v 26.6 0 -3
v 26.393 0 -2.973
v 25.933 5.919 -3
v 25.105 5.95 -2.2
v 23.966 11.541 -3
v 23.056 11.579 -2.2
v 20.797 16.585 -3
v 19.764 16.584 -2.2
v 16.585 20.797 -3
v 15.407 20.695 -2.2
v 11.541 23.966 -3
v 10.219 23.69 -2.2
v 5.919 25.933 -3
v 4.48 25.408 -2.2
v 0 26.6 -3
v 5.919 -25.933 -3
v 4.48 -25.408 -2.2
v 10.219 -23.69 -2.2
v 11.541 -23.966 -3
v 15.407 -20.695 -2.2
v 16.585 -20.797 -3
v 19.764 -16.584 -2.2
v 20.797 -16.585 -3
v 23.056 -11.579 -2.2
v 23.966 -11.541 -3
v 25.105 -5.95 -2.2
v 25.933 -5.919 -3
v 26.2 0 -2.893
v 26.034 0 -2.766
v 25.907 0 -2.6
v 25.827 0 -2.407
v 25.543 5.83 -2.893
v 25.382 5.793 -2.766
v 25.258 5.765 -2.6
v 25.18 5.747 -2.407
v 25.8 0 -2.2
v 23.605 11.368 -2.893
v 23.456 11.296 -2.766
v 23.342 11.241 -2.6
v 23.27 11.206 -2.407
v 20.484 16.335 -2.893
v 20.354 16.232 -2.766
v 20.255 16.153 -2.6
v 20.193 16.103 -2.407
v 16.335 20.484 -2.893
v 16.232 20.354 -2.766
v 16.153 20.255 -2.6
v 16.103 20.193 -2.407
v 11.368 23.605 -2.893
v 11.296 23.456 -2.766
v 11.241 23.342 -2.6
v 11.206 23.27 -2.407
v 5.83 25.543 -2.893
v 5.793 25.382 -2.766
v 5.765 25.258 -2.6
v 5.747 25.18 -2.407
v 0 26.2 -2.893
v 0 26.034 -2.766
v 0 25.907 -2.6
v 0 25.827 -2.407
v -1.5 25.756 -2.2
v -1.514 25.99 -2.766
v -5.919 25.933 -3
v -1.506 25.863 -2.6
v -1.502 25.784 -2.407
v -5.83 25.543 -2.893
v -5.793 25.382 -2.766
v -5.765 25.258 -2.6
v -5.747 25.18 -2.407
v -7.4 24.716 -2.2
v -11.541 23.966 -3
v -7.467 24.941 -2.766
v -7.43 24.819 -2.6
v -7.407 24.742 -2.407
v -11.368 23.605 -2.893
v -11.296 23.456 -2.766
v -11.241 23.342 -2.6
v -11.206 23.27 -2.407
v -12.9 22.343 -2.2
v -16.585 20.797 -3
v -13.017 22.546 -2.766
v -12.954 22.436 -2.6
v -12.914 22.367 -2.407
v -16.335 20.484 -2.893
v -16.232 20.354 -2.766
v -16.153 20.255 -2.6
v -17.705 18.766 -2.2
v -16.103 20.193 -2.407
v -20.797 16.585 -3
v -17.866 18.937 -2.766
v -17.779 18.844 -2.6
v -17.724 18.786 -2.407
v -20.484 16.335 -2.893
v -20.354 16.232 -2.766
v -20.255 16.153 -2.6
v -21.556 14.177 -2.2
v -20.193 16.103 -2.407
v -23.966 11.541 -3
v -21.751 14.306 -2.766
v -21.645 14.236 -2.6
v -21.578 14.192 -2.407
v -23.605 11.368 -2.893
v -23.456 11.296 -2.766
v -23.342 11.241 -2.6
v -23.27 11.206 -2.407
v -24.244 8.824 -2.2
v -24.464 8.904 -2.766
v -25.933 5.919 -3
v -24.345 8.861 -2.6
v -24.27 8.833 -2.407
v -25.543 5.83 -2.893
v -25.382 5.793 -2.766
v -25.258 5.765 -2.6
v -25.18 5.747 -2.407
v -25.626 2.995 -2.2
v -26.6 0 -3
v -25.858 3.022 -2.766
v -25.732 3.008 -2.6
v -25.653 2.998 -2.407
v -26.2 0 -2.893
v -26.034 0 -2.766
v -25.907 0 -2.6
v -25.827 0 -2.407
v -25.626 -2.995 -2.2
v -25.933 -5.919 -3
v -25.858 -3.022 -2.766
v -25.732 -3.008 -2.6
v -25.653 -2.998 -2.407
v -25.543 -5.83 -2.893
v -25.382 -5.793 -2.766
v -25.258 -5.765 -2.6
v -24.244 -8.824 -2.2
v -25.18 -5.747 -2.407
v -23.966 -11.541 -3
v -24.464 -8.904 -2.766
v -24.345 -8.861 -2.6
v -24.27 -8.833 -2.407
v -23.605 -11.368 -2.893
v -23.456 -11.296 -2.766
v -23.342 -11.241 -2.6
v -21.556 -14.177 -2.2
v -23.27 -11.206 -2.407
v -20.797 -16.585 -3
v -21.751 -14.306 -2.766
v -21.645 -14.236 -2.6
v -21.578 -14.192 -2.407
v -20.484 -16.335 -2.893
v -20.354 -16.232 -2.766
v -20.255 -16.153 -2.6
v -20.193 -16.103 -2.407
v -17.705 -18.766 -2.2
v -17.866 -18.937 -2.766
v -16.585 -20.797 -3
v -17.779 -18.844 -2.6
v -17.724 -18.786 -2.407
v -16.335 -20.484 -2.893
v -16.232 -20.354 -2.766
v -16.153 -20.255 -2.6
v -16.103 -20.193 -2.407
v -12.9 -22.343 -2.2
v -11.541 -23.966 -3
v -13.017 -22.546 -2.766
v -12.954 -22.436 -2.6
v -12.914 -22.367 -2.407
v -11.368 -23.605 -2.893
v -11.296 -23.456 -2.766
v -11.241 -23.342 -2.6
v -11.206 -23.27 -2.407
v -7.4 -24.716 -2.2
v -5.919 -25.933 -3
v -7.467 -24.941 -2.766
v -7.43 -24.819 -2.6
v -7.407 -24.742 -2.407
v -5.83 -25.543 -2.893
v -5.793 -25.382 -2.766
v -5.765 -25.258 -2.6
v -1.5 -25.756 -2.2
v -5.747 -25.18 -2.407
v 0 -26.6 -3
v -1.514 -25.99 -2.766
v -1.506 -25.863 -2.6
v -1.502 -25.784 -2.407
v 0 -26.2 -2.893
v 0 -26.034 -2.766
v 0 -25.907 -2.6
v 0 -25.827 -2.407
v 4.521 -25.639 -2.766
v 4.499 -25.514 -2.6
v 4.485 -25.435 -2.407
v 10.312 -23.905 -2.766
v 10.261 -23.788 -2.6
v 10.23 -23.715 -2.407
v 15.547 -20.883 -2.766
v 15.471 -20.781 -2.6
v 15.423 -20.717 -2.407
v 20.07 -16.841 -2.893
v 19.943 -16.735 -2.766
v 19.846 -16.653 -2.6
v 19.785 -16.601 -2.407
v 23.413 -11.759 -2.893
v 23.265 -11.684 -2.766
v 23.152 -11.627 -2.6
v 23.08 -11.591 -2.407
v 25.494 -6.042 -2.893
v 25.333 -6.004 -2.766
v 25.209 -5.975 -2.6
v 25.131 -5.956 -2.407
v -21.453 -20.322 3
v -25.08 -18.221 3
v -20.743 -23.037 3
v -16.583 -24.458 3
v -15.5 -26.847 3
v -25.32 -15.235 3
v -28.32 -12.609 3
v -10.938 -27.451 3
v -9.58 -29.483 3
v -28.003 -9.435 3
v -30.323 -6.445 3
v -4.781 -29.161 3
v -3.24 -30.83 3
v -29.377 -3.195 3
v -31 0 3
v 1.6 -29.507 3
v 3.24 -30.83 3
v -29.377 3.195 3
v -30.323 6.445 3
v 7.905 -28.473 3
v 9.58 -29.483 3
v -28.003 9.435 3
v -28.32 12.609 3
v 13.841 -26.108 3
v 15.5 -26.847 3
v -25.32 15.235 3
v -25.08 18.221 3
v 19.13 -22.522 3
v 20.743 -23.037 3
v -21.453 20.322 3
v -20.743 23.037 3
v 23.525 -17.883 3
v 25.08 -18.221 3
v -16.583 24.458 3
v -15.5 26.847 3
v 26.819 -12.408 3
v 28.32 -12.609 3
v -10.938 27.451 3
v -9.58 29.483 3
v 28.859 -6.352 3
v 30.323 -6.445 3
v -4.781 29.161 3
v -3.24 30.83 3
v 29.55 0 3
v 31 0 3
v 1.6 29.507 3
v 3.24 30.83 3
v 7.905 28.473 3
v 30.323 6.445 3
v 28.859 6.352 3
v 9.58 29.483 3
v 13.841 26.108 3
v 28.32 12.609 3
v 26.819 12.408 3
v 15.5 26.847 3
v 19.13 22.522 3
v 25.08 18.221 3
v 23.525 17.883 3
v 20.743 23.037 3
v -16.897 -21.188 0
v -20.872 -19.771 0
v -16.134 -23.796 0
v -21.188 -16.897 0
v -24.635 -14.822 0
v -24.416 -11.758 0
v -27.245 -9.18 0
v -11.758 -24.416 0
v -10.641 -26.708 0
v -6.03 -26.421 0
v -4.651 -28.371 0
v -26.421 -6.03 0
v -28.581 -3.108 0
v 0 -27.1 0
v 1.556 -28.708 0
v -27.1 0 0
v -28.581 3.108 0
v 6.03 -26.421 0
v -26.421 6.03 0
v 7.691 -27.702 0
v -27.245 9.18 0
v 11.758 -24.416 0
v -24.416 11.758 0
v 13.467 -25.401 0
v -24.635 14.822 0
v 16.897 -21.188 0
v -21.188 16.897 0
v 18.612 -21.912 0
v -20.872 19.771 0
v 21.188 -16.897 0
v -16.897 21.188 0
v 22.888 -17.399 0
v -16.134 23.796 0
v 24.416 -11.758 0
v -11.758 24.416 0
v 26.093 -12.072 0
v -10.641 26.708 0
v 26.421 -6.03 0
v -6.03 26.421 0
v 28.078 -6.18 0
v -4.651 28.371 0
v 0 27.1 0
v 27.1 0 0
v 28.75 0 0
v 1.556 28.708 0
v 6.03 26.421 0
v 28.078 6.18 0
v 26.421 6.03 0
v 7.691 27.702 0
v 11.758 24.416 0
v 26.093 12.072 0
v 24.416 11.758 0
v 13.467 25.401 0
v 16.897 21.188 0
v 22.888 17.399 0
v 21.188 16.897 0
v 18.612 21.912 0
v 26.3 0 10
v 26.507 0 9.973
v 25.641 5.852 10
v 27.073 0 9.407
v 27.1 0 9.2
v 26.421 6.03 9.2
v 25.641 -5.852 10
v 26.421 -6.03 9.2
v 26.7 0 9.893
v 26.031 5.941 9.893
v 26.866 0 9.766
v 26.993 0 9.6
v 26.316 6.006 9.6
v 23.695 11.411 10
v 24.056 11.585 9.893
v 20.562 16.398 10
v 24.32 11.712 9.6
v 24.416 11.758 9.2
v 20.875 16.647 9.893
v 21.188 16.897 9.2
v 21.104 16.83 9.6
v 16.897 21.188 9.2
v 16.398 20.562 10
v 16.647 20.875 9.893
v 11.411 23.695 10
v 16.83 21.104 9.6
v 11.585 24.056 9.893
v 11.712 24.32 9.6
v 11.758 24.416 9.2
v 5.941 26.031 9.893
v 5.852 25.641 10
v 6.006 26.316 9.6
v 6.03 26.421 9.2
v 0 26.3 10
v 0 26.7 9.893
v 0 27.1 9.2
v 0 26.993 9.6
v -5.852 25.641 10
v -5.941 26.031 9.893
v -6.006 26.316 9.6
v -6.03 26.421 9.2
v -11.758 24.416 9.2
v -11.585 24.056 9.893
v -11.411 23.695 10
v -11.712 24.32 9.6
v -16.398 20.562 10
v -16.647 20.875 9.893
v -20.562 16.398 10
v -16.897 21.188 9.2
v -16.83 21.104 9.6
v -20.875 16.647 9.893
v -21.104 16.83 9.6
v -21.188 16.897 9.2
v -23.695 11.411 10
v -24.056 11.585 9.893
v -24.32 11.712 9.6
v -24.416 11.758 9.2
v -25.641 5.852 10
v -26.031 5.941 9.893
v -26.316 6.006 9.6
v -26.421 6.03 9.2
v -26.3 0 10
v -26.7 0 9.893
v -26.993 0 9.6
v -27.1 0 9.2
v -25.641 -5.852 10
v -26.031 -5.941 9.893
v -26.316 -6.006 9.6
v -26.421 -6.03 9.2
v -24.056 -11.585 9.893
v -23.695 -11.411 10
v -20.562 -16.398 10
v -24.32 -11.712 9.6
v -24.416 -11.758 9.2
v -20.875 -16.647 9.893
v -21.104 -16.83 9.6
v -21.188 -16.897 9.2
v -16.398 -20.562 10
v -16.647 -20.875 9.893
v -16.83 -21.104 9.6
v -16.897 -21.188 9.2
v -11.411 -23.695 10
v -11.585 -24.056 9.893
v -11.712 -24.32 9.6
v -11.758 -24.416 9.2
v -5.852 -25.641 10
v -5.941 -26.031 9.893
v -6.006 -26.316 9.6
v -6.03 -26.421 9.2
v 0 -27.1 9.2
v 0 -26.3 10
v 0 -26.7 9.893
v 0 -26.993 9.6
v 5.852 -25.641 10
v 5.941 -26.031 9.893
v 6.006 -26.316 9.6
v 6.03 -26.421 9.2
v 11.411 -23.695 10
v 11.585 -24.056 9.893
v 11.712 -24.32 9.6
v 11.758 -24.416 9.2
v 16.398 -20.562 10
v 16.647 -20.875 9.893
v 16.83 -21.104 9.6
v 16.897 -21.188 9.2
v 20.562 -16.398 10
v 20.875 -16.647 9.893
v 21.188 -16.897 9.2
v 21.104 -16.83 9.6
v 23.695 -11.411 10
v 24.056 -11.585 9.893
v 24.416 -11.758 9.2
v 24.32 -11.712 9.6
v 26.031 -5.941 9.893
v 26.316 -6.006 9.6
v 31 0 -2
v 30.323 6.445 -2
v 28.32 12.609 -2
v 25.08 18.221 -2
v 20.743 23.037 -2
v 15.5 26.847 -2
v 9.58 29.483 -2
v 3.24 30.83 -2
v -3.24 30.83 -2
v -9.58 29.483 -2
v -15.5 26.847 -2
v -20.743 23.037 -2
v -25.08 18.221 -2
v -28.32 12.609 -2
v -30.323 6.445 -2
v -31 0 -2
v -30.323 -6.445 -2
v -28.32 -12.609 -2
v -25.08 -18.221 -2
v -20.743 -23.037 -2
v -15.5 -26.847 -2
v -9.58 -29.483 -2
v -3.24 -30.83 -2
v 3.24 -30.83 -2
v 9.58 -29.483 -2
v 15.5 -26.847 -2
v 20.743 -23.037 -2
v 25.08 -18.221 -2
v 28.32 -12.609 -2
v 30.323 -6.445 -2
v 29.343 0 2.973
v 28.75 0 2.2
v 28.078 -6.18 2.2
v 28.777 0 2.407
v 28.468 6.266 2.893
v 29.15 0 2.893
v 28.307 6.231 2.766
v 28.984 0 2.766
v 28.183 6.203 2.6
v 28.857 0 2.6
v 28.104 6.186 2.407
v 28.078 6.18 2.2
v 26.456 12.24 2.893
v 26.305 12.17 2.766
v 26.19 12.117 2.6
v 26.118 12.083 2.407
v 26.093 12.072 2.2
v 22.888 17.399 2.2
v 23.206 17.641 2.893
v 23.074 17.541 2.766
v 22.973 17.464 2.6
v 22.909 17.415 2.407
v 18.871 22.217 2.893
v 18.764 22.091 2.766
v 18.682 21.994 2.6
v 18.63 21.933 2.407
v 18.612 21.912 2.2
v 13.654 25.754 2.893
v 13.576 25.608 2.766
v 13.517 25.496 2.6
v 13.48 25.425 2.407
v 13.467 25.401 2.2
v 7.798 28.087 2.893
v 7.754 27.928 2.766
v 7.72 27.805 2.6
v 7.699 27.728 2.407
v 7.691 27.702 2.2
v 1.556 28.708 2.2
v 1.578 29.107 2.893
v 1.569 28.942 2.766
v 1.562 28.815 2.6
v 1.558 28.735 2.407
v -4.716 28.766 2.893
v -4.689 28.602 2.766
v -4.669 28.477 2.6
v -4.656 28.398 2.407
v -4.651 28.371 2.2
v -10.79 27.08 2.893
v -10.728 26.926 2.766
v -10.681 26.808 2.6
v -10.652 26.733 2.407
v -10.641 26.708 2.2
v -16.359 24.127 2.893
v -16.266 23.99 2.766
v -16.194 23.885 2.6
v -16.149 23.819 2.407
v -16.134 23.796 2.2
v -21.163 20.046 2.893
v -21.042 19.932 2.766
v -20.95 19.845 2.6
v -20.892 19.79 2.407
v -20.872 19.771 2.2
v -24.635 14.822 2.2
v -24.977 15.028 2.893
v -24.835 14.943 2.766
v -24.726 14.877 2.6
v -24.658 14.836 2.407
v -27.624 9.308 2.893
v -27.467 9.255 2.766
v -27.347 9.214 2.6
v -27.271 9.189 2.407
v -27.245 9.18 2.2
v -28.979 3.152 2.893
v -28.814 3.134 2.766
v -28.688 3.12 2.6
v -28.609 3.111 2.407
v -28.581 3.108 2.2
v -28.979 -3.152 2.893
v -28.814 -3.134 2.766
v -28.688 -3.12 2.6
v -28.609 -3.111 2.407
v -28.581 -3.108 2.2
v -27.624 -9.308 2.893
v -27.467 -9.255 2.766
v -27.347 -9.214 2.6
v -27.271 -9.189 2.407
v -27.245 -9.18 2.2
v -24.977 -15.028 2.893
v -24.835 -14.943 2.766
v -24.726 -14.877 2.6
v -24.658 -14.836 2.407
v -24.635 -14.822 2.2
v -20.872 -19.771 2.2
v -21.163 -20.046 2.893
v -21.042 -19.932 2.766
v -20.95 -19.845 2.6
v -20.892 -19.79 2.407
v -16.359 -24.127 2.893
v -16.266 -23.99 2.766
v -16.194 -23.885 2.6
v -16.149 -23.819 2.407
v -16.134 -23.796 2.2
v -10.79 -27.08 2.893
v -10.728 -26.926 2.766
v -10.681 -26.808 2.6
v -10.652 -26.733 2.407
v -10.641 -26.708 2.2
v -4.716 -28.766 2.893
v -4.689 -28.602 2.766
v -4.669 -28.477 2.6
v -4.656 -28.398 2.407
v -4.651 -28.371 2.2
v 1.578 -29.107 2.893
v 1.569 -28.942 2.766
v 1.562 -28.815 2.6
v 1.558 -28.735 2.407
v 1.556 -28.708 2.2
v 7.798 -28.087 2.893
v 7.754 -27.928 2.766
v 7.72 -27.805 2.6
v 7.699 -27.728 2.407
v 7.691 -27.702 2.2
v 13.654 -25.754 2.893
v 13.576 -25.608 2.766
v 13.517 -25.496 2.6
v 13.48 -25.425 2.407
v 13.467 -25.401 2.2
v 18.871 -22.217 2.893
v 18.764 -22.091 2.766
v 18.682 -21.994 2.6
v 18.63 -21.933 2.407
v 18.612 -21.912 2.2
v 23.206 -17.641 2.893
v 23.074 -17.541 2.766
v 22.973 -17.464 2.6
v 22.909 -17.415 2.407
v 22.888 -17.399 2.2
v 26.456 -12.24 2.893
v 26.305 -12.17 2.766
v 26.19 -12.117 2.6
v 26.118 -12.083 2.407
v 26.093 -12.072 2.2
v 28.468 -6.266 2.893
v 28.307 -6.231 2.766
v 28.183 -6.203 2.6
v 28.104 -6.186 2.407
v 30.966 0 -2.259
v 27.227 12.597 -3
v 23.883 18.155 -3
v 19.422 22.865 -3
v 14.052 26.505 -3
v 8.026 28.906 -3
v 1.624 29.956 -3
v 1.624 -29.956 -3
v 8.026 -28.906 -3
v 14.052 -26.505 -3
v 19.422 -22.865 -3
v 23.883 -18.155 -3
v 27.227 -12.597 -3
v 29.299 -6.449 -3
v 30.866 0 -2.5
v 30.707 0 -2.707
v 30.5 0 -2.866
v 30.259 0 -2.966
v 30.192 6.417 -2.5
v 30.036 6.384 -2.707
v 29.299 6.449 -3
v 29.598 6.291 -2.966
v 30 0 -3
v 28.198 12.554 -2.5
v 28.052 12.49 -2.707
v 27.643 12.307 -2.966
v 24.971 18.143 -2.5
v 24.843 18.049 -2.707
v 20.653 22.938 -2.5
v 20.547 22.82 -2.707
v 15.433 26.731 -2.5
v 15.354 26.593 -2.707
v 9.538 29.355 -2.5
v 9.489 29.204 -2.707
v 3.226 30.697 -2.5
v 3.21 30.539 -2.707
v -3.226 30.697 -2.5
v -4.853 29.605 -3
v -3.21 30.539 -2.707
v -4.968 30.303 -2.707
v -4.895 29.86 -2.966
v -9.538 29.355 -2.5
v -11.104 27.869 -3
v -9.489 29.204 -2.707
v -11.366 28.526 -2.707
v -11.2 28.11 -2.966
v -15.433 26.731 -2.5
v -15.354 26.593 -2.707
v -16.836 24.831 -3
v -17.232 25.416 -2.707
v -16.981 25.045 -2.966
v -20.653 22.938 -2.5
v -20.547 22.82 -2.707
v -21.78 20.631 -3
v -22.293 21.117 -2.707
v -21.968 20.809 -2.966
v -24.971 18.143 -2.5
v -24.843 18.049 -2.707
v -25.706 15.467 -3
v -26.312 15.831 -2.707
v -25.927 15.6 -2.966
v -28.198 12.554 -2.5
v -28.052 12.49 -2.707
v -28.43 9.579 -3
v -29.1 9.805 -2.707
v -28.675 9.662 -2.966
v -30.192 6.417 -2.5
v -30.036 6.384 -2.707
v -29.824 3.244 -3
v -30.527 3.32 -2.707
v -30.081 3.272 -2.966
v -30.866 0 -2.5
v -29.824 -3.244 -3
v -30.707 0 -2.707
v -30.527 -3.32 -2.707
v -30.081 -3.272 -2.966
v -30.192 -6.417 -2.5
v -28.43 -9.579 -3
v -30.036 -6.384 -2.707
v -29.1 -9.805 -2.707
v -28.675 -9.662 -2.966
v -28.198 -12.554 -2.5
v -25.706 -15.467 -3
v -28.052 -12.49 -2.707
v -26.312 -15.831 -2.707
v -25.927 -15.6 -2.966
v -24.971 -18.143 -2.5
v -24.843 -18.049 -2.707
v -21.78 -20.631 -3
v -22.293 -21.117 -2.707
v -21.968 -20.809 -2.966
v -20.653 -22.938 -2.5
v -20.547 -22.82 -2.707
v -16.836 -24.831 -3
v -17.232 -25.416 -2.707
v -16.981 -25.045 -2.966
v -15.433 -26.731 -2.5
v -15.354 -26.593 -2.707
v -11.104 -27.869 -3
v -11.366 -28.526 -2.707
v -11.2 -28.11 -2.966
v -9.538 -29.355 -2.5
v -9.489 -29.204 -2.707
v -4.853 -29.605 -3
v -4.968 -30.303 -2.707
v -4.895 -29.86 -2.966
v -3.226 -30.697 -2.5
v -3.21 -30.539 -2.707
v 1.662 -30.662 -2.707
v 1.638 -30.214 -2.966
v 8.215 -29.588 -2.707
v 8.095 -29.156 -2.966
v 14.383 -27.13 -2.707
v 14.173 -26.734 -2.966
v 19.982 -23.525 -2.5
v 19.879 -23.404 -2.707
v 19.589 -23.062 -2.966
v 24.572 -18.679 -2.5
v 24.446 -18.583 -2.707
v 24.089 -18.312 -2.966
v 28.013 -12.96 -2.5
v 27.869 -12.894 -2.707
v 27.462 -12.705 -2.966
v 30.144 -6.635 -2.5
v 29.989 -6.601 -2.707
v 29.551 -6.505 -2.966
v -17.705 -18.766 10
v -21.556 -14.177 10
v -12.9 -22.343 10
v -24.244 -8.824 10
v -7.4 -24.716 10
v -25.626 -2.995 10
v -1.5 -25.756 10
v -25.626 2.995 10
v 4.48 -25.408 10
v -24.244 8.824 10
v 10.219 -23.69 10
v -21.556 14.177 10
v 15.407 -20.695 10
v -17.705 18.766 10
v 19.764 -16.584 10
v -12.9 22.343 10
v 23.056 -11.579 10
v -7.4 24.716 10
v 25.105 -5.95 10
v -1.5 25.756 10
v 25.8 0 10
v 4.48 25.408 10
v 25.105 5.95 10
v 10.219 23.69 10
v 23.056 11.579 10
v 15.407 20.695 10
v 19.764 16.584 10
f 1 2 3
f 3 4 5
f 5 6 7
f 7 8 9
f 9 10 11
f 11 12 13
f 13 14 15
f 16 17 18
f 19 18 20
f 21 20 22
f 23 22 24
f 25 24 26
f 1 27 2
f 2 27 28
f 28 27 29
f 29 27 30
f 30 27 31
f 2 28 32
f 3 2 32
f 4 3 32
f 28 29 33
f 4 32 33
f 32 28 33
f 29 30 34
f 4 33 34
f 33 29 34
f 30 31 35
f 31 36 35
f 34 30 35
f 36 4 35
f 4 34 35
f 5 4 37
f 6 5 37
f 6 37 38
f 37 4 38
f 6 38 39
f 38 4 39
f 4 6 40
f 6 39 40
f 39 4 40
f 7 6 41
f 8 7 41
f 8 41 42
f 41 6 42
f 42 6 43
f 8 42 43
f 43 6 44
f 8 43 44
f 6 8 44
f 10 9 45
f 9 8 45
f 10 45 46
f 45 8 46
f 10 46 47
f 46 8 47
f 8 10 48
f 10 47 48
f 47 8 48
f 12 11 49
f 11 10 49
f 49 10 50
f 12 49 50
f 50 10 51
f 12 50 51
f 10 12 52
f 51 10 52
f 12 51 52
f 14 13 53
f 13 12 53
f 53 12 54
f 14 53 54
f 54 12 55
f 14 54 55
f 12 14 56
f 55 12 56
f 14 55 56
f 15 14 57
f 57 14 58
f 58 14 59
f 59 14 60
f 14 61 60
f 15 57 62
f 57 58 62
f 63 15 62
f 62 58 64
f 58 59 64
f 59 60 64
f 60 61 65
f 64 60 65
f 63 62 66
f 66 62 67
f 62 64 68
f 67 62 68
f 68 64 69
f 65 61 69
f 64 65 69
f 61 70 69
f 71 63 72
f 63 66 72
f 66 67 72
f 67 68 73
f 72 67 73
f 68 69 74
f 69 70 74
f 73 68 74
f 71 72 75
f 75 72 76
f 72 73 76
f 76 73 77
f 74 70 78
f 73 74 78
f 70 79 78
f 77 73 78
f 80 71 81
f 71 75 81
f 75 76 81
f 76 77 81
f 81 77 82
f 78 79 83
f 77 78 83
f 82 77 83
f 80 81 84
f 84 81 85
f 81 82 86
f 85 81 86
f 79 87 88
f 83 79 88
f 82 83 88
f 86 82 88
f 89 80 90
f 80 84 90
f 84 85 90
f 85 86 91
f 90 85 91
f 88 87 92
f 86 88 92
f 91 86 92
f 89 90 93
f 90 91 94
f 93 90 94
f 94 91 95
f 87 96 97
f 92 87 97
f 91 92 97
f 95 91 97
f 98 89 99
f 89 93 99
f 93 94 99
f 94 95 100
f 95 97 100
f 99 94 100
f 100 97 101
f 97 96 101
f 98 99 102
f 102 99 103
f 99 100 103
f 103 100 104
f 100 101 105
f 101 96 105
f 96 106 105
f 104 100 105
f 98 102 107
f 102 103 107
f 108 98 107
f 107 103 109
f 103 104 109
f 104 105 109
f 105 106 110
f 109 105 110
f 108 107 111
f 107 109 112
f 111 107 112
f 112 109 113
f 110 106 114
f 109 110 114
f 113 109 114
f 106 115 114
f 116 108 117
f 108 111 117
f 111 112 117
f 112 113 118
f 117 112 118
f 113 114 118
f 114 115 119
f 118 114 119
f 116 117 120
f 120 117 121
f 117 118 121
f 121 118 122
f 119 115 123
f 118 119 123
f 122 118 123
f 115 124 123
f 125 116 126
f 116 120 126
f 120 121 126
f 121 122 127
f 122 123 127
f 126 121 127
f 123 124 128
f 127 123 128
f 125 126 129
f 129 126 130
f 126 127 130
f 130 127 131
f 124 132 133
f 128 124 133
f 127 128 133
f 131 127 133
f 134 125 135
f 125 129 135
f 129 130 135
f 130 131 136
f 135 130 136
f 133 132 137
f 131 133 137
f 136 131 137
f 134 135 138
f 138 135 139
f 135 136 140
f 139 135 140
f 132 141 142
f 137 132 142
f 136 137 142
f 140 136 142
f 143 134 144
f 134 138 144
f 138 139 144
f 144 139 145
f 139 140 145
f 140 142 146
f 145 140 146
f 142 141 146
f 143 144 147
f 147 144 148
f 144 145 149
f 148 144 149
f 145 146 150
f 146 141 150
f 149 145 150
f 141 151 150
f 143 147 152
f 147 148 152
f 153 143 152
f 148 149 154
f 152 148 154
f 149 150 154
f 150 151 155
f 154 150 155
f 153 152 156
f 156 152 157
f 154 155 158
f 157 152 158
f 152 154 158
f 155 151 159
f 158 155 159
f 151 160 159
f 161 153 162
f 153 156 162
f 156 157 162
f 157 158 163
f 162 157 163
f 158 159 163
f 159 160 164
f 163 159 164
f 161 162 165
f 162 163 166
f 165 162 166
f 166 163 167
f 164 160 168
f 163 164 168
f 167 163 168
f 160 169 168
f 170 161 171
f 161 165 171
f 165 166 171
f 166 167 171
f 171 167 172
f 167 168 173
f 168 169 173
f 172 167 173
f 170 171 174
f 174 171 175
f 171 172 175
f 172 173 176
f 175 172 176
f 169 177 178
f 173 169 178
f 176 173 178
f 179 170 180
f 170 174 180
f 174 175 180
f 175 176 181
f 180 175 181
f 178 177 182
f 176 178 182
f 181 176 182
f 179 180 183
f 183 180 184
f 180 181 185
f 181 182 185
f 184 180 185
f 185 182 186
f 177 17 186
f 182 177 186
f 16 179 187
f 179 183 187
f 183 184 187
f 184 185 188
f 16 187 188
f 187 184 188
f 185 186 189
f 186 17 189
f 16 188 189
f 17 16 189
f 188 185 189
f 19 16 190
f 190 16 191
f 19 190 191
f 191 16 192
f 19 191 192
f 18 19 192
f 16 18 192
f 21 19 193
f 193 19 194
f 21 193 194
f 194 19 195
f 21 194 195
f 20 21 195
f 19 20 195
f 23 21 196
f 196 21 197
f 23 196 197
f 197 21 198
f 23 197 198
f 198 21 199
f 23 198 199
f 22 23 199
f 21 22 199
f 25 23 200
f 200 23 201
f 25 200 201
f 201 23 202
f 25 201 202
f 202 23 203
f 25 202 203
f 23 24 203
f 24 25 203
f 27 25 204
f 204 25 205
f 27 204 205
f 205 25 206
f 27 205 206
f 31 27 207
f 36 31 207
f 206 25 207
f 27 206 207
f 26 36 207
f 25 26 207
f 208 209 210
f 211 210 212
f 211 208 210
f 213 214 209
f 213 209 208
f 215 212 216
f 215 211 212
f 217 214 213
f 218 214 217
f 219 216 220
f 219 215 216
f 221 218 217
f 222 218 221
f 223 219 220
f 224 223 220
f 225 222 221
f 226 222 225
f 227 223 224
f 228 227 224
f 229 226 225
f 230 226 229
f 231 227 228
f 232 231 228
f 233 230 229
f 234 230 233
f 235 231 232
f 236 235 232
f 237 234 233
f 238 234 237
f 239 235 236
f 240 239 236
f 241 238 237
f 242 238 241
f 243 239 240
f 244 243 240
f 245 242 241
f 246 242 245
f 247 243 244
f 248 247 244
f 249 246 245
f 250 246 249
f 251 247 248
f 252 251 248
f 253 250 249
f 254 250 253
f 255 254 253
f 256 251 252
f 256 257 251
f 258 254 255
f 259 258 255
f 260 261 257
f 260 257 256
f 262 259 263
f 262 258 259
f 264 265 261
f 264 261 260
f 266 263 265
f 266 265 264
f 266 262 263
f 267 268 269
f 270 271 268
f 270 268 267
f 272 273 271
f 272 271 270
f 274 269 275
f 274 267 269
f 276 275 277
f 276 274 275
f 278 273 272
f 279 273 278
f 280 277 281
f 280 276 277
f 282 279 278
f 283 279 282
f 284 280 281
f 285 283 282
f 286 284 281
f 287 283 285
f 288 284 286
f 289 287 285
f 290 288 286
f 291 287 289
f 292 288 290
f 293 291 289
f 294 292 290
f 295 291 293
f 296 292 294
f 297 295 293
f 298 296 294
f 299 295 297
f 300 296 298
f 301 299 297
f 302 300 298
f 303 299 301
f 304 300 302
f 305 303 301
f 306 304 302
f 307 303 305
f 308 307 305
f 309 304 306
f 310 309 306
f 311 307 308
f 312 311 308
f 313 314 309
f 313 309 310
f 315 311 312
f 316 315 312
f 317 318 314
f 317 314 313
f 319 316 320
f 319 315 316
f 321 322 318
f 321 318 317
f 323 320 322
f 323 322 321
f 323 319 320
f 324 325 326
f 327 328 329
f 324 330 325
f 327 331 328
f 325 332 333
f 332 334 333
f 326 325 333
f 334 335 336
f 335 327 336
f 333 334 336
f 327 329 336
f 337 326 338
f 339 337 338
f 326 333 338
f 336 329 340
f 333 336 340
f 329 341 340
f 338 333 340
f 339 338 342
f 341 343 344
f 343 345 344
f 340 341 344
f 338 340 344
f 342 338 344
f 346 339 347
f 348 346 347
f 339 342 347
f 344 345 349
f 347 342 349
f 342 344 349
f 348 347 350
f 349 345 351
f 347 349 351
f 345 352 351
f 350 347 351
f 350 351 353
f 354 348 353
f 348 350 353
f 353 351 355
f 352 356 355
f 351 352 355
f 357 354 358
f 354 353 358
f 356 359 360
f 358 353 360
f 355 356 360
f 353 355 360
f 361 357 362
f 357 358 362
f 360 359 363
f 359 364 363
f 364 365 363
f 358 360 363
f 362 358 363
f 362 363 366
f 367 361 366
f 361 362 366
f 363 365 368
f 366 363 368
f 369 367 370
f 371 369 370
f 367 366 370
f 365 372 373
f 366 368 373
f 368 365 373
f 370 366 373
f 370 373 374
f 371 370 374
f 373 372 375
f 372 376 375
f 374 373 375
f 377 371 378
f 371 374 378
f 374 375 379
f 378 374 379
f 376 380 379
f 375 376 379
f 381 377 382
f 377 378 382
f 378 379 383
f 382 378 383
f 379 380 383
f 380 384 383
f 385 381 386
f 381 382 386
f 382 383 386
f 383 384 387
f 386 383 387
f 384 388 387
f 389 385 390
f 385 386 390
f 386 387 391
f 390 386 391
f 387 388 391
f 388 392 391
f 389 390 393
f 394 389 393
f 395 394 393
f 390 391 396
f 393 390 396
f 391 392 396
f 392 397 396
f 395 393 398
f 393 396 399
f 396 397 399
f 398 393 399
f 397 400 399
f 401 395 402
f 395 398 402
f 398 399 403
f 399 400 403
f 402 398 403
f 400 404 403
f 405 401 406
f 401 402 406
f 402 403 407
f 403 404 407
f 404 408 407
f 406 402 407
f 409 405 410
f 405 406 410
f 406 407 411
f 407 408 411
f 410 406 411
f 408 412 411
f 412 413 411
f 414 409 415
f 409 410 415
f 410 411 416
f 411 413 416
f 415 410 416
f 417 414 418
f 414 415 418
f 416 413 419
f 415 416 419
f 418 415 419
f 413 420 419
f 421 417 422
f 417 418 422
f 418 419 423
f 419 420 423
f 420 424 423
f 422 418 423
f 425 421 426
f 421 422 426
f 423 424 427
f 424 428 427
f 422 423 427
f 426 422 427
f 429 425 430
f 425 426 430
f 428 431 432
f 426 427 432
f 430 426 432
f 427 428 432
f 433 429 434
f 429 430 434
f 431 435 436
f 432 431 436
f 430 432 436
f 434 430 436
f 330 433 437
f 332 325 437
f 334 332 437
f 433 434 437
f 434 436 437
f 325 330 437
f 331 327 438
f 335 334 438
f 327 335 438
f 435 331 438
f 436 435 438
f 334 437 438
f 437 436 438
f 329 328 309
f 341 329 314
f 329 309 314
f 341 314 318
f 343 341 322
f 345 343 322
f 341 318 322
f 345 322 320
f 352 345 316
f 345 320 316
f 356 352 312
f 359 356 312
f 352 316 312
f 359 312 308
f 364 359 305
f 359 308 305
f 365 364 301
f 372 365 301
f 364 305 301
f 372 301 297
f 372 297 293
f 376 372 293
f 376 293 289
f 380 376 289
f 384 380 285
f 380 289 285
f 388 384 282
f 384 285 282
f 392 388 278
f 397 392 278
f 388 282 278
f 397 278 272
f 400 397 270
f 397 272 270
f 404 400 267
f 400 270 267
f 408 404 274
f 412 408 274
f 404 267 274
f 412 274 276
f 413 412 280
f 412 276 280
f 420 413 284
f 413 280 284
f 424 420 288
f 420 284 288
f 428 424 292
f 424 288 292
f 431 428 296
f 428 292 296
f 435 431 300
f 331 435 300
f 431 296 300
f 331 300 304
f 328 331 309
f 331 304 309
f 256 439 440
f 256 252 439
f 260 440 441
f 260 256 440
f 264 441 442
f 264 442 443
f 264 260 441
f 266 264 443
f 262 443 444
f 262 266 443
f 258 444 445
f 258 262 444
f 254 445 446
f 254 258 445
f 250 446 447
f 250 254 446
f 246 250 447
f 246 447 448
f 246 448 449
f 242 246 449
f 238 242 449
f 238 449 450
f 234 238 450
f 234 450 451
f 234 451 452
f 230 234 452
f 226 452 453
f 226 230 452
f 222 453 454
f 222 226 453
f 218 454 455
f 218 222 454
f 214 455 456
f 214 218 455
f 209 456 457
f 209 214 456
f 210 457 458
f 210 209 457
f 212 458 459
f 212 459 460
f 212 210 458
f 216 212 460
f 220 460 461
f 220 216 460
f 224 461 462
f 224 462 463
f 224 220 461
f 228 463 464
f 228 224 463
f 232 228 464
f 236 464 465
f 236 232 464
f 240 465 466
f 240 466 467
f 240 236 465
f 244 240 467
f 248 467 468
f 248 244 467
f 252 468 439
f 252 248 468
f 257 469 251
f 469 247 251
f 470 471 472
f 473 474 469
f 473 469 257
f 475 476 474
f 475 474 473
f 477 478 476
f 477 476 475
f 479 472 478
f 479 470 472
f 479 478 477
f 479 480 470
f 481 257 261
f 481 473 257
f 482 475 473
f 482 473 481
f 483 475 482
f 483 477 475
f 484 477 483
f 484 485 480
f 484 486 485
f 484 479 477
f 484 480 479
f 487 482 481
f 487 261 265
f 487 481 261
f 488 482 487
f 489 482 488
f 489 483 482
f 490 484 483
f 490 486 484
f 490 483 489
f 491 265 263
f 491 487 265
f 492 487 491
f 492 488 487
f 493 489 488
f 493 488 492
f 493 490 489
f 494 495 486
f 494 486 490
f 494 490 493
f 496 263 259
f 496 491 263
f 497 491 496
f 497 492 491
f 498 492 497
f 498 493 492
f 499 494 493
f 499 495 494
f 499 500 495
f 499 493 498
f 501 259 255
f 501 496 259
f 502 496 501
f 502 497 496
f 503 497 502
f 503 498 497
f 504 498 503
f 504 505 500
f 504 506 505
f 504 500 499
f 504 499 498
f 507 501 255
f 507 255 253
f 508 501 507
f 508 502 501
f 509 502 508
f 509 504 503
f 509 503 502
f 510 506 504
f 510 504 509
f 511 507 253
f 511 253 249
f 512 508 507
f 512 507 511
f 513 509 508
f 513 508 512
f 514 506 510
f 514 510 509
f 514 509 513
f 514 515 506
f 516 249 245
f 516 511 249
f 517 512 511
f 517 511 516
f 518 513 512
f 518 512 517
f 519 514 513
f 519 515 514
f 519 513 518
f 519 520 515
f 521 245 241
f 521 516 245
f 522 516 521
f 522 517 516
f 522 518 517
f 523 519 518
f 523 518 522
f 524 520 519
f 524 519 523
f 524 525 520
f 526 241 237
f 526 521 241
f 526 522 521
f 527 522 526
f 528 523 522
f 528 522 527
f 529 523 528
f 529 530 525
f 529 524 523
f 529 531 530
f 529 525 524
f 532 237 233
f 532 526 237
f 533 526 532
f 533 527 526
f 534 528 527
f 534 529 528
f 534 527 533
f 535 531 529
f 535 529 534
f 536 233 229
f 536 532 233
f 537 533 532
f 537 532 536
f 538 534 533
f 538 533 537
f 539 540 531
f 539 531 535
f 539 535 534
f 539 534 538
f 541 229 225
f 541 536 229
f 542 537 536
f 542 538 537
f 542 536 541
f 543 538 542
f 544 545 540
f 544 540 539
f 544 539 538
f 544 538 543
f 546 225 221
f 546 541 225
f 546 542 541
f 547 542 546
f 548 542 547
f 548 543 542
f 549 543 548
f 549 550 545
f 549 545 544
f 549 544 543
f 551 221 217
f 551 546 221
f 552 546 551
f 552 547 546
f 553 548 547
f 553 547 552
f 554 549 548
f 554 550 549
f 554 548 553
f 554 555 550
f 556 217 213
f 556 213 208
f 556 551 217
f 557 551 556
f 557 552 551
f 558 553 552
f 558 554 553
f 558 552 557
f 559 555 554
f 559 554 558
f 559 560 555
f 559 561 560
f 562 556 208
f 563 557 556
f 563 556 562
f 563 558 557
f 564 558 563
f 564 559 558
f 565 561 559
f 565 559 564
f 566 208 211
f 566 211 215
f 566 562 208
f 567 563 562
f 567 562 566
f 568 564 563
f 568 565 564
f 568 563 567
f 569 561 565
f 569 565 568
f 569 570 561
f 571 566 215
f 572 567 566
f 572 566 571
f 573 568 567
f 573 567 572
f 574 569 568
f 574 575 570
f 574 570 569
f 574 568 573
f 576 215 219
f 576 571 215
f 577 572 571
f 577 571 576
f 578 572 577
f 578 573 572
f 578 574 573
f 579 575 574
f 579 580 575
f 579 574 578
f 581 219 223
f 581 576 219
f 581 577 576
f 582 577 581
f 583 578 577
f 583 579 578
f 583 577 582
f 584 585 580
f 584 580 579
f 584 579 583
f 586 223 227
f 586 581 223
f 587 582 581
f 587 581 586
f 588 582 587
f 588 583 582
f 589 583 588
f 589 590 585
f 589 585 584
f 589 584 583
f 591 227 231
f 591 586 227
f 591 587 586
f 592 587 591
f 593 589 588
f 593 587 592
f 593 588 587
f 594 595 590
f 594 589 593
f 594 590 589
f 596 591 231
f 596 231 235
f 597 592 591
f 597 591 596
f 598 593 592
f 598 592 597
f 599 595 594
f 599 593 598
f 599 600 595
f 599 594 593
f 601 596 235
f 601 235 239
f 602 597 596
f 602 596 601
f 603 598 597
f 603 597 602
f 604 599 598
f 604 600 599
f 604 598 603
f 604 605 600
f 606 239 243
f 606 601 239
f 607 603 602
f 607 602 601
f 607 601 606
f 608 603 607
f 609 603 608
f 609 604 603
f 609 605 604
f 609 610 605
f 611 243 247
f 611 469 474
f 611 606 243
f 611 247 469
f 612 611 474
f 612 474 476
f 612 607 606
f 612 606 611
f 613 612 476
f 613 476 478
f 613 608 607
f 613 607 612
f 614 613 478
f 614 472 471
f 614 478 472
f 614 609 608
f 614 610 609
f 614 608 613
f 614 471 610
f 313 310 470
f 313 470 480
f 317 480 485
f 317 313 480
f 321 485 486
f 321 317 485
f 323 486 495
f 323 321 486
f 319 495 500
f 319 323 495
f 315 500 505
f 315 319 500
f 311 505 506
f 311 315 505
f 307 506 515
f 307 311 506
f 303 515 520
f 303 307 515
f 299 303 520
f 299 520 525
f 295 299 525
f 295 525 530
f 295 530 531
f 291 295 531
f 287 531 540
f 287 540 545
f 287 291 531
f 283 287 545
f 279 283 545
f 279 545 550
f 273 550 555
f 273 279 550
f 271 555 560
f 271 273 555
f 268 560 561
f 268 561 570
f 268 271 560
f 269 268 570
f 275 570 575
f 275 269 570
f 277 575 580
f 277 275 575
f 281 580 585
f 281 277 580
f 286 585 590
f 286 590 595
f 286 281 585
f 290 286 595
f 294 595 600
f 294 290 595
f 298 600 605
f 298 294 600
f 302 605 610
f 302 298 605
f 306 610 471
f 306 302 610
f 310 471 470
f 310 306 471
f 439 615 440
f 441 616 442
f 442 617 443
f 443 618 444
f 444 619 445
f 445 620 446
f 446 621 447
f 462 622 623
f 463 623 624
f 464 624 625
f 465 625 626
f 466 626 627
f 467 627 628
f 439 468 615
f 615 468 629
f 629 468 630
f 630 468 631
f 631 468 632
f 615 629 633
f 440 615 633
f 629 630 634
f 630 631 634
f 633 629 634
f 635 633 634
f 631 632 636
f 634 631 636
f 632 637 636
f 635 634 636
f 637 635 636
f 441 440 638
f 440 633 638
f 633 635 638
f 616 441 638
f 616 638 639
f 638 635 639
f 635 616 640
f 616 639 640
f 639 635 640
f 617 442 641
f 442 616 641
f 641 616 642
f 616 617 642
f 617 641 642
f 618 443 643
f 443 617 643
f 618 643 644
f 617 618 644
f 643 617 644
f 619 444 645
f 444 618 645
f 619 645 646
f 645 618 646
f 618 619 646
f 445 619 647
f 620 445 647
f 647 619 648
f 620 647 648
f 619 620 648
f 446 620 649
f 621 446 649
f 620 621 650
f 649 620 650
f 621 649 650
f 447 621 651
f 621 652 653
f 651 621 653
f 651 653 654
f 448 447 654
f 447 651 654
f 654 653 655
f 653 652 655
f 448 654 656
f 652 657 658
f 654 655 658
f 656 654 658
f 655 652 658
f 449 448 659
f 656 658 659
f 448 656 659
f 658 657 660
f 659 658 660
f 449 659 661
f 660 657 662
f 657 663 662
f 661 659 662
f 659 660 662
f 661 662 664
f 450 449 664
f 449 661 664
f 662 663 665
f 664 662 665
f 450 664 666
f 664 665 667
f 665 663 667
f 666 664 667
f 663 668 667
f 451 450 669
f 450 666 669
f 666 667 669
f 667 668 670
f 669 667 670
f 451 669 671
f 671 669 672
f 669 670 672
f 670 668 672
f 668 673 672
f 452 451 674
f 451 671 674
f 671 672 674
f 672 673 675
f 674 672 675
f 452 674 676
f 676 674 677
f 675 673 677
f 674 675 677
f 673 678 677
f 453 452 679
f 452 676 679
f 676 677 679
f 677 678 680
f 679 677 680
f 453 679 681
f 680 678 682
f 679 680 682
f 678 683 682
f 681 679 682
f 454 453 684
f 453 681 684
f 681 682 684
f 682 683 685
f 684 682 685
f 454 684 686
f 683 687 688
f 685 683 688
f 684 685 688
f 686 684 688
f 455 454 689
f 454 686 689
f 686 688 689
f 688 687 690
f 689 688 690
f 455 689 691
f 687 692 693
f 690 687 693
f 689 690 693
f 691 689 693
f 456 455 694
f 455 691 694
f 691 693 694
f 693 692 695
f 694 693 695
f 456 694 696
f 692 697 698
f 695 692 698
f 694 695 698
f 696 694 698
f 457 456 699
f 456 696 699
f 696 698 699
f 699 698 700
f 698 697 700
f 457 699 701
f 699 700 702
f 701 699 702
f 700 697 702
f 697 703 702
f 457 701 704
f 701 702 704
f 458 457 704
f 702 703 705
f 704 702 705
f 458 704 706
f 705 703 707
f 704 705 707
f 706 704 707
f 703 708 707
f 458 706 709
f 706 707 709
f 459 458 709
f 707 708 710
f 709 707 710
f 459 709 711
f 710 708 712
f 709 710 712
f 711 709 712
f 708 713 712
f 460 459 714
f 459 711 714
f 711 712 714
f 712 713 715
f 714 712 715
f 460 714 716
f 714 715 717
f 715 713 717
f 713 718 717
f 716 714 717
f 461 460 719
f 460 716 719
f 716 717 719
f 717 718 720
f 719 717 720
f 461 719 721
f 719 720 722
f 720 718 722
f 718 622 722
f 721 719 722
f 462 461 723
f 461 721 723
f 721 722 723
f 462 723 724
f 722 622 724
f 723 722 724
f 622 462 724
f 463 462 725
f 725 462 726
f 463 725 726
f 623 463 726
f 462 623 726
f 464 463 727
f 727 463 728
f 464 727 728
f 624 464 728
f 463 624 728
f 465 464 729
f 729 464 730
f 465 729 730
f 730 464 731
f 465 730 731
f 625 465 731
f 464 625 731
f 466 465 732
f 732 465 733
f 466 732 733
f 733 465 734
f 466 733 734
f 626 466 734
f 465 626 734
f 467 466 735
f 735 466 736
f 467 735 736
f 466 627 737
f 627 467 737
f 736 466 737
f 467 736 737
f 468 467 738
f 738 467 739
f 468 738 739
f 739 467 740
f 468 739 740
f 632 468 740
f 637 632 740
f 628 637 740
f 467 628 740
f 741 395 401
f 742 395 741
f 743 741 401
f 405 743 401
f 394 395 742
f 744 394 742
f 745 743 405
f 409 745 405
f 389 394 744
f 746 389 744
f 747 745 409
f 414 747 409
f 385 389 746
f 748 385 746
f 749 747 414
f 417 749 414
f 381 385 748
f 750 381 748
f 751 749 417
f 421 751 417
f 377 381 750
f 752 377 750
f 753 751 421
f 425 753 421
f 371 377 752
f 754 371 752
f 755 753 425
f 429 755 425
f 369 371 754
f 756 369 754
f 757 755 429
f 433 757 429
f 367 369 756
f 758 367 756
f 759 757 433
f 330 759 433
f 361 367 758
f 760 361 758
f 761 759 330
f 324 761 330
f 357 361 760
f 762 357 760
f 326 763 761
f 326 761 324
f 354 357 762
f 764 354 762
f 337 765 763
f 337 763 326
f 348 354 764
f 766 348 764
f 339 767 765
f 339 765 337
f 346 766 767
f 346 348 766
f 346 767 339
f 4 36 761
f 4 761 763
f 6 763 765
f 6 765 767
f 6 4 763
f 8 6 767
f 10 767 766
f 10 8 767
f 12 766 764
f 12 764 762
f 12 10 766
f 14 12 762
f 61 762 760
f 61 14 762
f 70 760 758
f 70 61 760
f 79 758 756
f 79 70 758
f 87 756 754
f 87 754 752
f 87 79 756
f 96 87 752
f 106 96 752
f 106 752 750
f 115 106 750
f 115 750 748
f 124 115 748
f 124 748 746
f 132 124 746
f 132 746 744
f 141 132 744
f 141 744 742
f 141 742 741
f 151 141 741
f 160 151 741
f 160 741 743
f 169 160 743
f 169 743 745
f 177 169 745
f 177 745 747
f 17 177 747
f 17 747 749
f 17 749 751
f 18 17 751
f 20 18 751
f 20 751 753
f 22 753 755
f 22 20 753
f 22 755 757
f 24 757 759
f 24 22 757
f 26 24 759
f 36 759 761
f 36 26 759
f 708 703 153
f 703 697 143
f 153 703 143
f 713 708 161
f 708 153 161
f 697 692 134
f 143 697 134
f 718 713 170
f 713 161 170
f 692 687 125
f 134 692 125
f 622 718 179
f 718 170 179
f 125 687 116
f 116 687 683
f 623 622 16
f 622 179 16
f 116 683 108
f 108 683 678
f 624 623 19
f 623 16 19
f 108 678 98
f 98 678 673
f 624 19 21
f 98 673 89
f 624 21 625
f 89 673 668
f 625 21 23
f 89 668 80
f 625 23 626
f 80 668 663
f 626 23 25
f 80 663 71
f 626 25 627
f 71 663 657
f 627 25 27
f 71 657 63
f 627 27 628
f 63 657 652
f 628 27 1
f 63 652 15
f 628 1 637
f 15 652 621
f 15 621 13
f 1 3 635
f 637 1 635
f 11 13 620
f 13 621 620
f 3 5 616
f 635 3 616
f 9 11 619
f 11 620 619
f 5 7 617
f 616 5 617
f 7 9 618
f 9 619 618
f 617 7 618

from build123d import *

# Parameters (mm, degrees)
F0_R     = 31
F0_R_2   = 28.75
F0_R_3   = 27.1
F0_R_4   = 25.8
F1_DEPTH = 3
F2_DEPTH = 10
F3_DEPTH = 3
F4_DEPTH = 25
F5_R     = 0.8
F6_R     = 1


with BuildPart() as f1:
    # F0 (on Top) → F1 (new body)
    with BuildSketch(Plane.XY):
        Circle(F0_R)
        Circle(F0_R_2, mode=Mode.SUBTRACT)
        Circle(F0_R_2)
        Circle(F0_R_3, mode=Mode.SUBTRACT)
        Circle(F0_R_3)
        Circle(F0_R_4, mode=Mode.SUBTRACT)
    extrude(amount=-F1_DEPTH)

    # F0 (on Top) → F2 (join)
    with BuildSketch(Plane.XY):
        Circle(F0_R_3)
        Circle(F0_R_4, mode=Mode.SUBTRACT)
    extrude(amount=F2_DEPTH)

    # F0 (on Top) → F3 (join)
    with BuildSketch(Plane.XY):
        Circle(F0_R)
        Circle(F0_R_2, mode=Mode.SUBTRACT)
    extrude(amount=F3_DEPTH)

    # F0 (on Top) → F4 (cut)
    with BuildSketch(Plane.XY):
        Circle(F0_R_4)
    extrude(amount=F4_DEPTH, mode=Mode.SUBTRACT)

    # F5
    f5_edges = [f1.edges().sort_by_distance(p)[0] for p in [
        (-25.8, 0, -3),
        (-28.75, 0, 3),
        (-27.1, 0, 10),
    ]]
    fillet(f5_edges, radius=F5_R)

    # F6
    f6_edges = [f1.edges().sort_by_distance(p)[0] for p in [
        (-31, 0, -3),
    ]]
    fillet(f6_edges, radius=F6_R)


solid = f1.part
